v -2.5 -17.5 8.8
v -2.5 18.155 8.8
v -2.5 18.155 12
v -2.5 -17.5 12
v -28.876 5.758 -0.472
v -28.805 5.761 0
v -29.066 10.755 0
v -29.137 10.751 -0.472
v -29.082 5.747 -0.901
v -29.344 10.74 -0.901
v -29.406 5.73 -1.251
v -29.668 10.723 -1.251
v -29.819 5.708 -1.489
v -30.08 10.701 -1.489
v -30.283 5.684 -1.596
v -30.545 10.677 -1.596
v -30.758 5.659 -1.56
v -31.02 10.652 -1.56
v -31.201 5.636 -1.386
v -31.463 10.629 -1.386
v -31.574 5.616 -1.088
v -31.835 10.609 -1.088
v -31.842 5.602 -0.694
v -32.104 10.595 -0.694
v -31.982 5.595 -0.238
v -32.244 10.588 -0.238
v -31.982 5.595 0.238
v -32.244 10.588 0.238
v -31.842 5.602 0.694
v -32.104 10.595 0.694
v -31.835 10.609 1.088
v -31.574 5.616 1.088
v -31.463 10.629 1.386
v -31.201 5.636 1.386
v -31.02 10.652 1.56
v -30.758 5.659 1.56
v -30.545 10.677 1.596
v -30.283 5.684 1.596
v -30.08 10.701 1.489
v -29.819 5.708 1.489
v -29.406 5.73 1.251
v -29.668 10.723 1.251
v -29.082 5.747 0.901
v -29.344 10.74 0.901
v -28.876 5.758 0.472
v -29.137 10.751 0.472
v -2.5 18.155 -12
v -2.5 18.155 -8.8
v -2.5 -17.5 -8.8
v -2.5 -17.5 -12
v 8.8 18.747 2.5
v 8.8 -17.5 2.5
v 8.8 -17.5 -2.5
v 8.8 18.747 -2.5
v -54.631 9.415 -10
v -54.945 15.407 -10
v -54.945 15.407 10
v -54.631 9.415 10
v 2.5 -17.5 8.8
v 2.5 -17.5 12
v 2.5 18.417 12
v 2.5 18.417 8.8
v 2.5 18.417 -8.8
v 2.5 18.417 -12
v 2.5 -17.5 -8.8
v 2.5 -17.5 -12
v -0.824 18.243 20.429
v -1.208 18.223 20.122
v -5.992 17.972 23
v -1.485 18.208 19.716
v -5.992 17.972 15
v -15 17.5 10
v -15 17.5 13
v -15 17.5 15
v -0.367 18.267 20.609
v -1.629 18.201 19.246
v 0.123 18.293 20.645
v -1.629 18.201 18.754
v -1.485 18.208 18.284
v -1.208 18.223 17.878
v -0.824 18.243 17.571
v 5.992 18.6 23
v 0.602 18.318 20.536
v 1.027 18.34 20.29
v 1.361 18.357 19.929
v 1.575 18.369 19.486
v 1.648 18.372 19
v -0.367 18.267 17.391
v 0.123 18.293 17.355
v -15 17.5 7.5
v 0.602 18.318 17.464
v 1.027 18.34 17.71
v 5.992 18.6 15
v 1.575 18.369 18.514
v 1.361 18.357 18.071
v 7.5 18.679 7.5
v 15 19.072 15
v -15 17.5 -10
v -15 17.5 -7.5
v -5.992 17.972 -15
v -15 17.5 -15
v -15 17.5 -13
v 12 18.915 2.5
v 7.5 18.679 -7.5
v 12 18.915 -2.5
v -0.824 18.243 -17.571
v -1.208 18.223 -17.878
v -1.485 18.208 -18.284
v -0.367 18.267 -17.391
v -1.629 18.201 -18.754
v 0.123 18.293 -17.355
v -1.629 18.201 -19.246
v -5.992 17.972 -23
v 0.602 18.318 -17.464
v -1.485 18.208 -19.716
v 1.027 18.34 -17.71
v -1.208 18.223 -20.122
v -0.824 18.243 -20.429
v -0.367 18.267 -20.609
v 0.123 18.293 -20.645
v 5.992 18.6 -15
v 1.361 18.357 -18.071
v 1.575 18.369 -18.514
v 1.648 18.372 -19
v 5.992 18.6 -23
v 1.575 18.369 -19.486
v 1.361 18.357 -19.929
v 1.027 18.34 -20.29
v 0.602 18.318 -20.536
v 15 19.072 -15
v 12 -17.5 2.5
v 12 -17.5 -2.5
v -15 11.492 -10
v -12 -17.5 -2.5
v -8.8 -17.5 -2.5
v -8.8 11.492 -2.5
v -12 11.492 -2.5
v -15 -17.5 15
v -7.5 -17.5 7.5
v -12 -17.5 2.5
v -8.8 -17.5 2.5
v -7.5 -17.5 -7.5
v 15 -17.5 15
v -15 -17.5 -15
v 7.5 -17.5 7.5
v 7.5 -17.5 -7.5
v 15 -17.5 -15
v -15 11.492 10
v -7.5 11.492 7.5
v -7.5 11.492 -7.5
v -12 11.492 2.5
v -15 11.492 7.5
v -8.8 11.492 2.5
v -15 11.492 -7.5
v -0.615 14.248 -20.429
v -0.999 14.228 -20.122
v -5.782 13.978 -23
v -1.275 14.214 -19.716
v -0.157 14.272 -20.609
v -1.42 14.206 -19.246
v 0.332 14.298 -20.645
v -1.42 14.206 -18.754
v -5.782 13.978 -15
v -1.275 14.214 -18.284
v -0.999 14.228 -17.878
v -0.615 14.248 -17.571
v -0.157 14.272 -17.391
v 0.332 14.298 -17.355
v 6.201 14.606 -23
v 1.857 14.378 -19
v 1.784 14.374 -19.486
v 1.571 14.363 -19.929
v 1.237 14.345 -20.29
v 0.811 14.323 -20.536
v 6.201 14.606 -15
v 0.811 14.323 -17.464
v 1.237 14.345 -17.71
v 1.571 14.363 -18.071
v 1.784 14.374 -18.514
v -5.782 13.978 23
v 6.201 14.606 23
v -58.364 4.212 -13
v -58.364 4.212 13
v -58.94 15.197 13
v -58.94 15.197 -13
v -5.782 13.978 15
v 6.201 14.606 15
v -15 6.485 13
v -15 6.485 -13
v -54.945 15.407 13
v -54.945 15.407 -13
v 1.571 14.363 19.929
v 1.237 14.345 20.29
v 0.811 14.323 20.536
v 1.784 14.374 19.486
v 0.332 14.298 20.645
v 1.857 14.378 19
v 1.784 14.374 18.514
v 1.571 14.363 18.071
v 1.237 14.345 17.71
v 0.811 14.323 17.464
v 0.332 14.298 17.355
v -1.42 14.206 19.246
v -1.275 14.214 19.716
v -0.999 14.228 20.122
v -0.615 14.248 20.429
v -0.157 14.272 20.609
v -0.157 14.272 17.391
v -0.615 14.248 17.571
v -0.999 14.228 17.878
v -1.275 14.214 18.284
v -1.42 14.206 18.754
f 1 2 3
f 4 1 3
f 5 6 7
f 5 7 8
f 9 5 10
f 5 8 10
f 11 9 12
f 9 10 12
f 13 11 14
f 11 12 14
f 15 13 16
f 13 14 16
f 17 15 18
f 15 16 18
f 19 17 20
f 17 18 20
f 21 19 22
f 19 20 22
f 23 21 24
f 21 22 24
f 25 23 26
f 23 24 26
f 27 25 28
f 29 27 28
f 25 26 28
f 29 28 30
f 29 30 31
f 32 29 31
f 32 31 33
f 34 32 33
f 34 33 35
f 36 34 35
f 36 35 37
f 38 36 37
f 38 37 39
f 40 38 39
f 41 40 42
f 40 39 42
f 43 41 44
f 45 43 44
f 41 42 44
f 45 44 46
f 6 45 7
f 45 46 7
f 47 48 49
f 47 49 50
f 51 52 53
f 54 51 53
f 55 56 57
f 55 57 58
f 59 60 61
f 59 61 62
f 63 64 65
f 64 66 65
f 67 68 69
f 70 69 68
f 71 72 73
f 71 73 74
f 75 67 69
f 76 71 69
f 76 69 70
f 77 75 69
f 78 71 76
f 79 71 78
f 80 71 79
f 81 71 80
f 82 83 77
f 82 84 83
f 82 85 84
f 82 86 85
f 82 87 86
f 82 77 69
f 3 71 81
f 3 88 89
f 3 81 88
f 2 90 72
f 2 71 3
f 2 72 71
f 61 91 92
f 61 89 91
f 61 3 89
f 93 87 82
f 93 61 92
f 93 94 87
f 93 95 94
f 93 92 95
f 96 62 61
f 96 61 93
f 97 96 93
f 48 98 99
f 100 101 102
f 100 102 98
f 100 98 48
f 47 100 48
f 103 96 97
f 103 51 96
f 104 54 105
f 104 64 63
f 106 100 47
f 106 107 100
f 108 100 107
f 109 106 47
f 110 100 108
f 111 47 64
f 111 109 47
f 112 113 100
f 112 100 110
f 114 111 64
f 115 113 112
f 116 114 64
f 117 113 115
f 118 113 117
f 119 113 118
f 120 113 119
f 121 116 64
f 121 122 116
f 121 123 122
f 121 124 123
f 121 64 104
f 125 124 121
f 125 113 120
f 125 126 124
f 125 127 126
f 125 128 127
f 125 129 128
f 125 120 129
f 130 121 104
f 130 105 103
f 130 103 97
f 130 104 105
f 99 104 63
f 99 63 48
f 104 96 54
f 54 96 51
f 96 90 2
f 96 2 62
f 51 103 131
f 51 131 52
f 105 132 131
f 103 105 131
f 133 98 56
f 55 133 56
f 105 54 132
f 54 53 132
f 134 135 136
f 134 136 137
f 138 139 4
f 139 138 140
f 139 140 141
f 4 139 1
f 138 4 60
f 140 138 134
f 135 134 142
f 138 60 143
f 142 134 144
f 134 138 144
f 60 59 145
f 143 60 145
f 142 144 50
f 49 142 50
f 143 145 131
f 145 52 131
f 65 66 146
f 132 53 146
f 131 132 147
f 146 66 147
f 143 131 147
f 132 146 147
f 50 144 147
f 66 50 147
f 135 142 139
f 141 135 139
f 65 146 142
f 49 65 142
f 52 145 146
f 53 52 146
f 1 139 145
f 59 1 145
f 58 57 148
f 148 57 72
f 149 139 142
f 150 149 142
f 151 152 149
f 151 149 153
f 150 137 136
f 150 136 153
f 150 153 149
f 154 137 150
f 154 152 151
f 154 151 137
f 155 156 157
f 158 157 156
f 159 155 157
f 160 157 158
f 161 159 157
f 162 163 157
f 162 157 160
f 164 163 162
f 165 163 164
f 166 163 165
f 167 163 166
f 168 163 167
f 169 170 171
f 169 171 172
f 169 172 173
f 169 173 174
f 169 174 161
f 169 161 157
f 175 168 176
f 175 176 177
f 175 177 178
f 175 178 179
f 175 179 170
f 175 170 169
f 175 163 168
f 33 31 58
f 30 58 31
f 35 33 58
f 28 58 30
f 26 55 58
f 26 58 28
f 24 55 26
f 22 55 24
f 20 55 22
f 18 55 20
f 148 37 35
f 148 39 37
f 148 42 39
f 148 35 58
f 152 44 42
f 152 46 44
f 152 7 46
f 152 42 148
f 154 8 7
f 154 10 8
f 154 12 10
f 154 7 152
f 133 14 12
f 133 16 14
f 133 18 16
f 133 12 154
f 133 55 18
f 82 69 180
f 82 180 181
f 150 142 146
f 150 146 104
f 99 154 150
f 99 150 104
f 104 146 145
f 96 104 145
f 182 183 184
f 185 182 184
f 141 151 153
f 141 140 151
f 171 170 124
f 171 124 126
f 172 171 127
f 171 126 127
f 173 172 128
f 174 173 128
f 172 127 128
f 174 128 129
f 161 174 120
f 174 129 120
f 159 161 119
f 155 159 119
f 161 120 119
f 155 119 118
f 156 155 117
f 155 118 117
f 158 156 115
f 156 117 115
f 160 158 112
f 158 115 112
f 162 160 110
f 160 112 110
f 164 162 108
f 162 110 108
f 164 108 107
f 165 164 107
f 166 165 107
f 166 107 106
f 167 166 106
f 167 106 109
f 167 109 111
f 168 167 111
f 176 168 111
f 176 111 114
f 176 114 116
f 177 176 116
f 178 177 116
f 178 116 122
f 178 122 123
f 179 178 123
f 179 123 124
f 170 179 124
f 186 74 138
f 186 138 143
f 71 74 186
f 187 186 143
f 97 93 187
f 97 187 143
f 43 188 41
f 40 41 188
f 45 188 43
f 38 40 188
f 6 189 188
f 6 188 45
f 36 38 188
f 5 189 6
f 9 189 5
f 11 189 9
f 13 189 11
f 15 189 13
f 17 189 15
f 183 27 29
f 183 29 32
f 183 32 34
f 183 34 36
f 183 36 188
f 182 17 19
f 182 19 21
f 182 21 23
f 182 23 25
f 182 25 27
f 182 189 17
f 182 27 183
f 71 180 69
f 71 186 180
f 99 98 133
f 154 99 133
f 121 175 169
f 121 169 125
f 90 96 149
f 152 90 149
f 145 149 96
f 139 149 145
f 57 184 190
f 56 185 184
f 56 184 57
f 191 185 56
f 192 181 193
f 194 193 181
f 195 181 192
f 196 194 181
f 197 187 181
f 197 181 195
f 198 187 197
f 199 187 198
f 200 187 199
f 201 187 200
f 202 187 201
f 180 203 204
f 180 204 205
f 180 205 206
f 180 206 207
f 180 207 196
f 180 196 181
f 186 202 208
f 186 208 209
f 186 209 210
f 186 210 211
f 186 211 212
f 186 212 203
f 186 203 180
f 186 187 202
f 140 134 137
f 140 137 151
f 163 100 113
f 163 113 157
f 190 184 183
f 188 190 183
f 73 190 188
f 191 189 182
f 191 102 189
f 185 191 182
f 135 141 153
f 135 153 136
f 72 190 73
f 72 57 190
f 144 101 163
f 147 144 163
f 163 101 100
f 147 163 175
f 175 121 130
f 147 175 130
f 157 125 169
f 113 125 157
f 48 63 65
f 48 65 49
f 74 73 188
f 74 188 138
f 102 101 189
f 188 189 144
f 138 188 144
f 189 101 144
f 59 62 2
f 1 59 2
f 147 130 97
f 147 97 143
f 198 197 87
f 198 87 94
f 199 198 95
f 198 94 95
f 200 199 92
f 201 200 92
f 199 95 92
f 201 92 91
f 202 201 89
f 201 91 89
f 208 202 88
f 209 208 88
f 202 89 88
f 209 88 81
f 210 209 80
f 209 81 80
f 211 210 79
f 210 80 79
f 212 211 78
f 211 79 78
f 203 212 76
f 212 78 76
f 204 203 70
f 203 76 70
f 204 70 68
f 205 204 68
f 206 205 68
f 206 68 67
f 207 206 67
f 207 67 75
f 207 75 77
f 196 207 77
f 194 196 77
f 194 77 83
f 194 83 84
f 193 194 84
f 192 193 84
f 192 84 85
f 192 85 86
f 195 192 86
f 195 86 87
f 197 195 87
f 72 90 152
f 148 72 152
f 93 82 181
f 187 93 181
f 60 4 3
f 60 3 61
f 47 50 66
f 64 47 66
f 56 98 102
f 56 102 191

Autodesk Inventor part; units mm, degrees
ref_plane "YZ Plane" through (0, 0, 0) normal (1, 0, 0) x (0, 1, 0)
ref_plane "XZ Plane" through (0, 0, 0) normal (0, 1, 0) x (-1, 0, 0)
ref_plane "XY Plane" through (0, 0, 0) normal (0, 0, 1) x (1, 0, 0)
sketch "Sketch1" plane through (0, 0, 0) normal (0, 0, 1) x (1, 0, 0)
  line L0 (-15, -17.5) -> (15, -17.5)
  line L1 (15, -17.5) -> (15, 17.5)
  line L2 (15, 17.5) -> (-15, 17.5)
  line L3 (-15, 17.5) -> (-15, -17.5)
  line L4 (-15, -17.5) -> (15, 17.5) construction
  line L5 (15, -17.5) -> (-15, 17.5) construction
  line L6 (-15, 17.5) -> (15, 19.0722)
  line L7 (15, 19.0722) -> (15, 17.5)
  point P0 (0, 0)
  dimension "d0" = 3
  dimension "d1" = 30
  dimension "d3" = 35
extrude "Extrusion1" add sketch "Sketch1" along normal mid plane 30
sketch "Sketch2" plane through (-15, -17.5, -15) normal (0, -1, 0) x (1, 0, 0)
  line L0 (7.5, 7.5) -> (22.5, 7.5)
  line L1 (22.5, 7.5) -> (22.5, 22.5)
  line L2 (22.5, 22.5) -> (7.5, 22.5)
  line L3 (7.5, 22.5) -> (7.5, 7.5)
  line L4 (7.5, 7.5) -> (22.5, 22.5) construction
  line L5 (22.5, 7.5) -> (7.5, 22.5) construction
  line L6 (0, 30) -> (0, 0) projected
  line L7 (30, 0) -> (0, 0) projected
  line L8 (12.5, 3) -> (17.5, 3)
  line L9 (17.5, 3) -> (17.5, 6.2)
  line L10 (17.5, 6.2) -> (12.5, 6.2)
  line L11 (12.5, 6.2) -> (12.5, 3)
  line L12 (12.5, 3) -> (17.5, 6.2) construction
  line L13 (17.5, 3) -> (12.5, 6.2) construction
  line L14 (3, 17.5) -> (6.2, 17.5)
  line L15 (6.2, 17.5) -> (6.2, 12.5)
  line L16 (6.2, 12.5) -> (3, 12.5)
  line L17 (3, 12.5) -> (3, 17.5)
  line L18 (3, 17.5) -> (6.2, 12.5) construction
  line L19 (6.2, 17.5) -> (3, 12.5) construction
  line L20 (15, 7.5) -> (15, 22.5)
  line L21 (7.5, 15) -> (22.5, 15)
  line L22 (12.5, 27) -> (17.5, 27)
  line L23 (17.5, 27) -> (17.5, 23.8)
  line L24 (17.5, 23.8) -> (12.5, 23.8)
  line L25 (12.5, 23.8) -> (12.5, 27)
  line L26 (12.5, 27) -> (17.5, 23.8) construction
  line L27 (17.5, 27) -> (12.5, 23.8) construction
  line L28 (27, 17.5) -> (23.8, 17.5)
  line L29 (23.8, 17.5) -> (23.8, 12.5)
  line L30 (23.8, 12.5) -> (27, 12.5)
  line L31 (27, 12.5) -> (27, 17.5)
  line L32 (27, 17.5) -> (23.8, 12.5) construction
  line L33 (23.8, 17.5) -> (27, 12.5) construction
  point P0 (15, 15)
  point P1 (15, 15)
  point P2 (0, 15)
  point P3 (15, 0)
  point P4 (15, 4.6)
  point P5 (4.6, 15)
  point P6 (0, 15)
  point P7 (3, 15)
  point P8 (15, 0)
  point P9 (15, 25.4)
  point P10 (25.4, 15)
  point P11 (27, 15)
  dimension "d6" = 15
  dimension "d7" = 5
  dimension "d8" = 3.2
  dimension "d9" = 3
  dimension "d10" = 3
extrude "Extrusion2" cut sketch "Sketch2" against normal through all
sketch "Sketch3" plane through (0, 0, 0) normal (0, 0, 1) x (1, 0, 0)
  line L0 (-15, -17.5) -> (-15, 17.5) projected
  line L1 (-15, 6.4849) -> (-58.364, 4.2123)
  line L2 (-58.364, 4.2123) -> (-58.9397, 15.1972)
  line L3 (-58.9397, 15.1972) -> (-54.9452, 15.4066)
  line L4 (-54.9452, 15.4066) -> (-54.6312, 9.4148)
  line L5 (-54.6312, 9.4148) -> (-15, 11.4918)
  line L6 (15, 19.0722) -> (-15, 17.5) projected
  line L7 (-54.9452, 15.4066) -> (-15, 17.5)
  point P0 (0, 0)
  dimension "d14" = 4
  dimension "d15" = 5
  dimension "d16" = 6
  dimension "d17" = 40
extrude "Extrusion3" add sketch "Sketch3" along normal mid plane 20 contours L1 L2 L3 L4 L5 L0
sketch "Sketch4" plane through (-54.6312, 9.4148, 10) normal (-0.0523, 0.9986, 0) x (0.9986, 0.0523, 0)
  circle A0 centre (24, 10) radius 1.6
  line L0 (39.6856, 20) -> (39.6856, 0) projected
  line L1 (0, 0) -> (0, 20) projected
  point P0 (54.0636, 10)
  point P1 (39.6856, 10)
  dimension "d20" = 3.2
  dimension "d21" = 24
extrude "Extrusion4" cut sketch "Sketch4" against normal blind 20
sketch "Sketch5" plane through (-15, -17.5, 15) normal (-1, 0, 0) x (0, 0, 1)
  line L0 (-22.5, 36.9918) -> (-7.5, 36.9918)
  line L1 (-7.5, 36.9918) -> (-7.5, 28.9918)
  line L2 (-7.5, 28.9918) -> (-22.5, 28.9918)
  line L3 (-22.5, 28.9918) -> (-22.5, 36.9918)
  line L4 (-22.5, 36.9918) -> (-7.5, 28.9918) construction
  line L5 (-7.5, 36.9918) -> (-22.5, 28.9918) construction
  line L6 (-30, 35) -> (0, 35) projected
  line L7 (-25, 28.9918) -> (-5, 28.9918) projected
  point P0 (-15, 17.5)
  point P1 (-15, 32.9918)
  point P2 (-15, 35)
  point P3 (-15, 28.9918)
  dimension "d24" = 15
  dimension "d25" = 8
extrude "Extrusion5" cut sketch "Sketch5" against normal up to surface (22.5 mm away)
sketch "Sketch7" plane through (0, 0, 15) normal (0, 0, 1) x (1, 0, 0)
  line L0 (15, 19.0722) -> (-15, 17.5) projected
  line L1 (-5.9918, 17.9721) -> (5.9918, 18.6001)
  line L2 (5.9918, 18.6001) -> (6.2011, 14.6056)
  line L3 (6.2011, 14.6056) -> (-5.7824, 13.9776)
  line L4 (-5.7824, 13.9776) -> (-5.9918, 17.9721)
  line L5 (-5.9918, 17.9721) -> (6.2011, 14.6056) construction
  line L6 (5.9918, 18.6001) -> (-5.7824, 13.9776) construction
  point P0 (0, 0)
  point P1 (0, 18.2861)
  point P2 (0.1047, 16.2889)
  point P3 (0, 18.2861)
  point P4 (5.9918, 18.6001)
  point P5 (-5.9918, 17.9721)
  dimension "d30" = 12
  dimension "d31" = 4
extrude "Extrusion6" add sketch "Sketch7" along normal blind 8
sketch "Sketch8" plane through (15, 19.0722, 15) normal (-0.0523, 0.9986, 0) x (0.9986, 0.0523, 0)
  circle A0 centre (-15.0206, -4) radius 1.65
  line L0 (-9.0206, 0) -> (-9.0206, -8) projected
  line L1 (-9.0206, -8) -> (-21.0206, -8) projected
  line L2 (-9.0206, 0) -> (-21.0206, 0) projected
  point P0 (-15.9776, 15)
  point P1 (-9.0206, -4)
  point P2 (-15.0206, -8)
  point P3 (-15.0206, 0)
  dimension "d34" = 3.3
  dimension "d37" = 4
extrude "Extrusion7" cut sketch "Sketch8" against normal blind 12
mirror "Mirror1" about plane through (0, 0, 0) normal (0, 0, 1) of "Extrusion6", "Extrusion7"
extrude "Extrusion8" add sketch "Sketch3" along normal blind 3 from surface at 10
mirror "Mirror2" about plane through (0, 0, 0) normal (0, 0, 1) of "Extrusion8"
equation "\"d10\" = d9"
properties part number "Upper Path Fixation"
